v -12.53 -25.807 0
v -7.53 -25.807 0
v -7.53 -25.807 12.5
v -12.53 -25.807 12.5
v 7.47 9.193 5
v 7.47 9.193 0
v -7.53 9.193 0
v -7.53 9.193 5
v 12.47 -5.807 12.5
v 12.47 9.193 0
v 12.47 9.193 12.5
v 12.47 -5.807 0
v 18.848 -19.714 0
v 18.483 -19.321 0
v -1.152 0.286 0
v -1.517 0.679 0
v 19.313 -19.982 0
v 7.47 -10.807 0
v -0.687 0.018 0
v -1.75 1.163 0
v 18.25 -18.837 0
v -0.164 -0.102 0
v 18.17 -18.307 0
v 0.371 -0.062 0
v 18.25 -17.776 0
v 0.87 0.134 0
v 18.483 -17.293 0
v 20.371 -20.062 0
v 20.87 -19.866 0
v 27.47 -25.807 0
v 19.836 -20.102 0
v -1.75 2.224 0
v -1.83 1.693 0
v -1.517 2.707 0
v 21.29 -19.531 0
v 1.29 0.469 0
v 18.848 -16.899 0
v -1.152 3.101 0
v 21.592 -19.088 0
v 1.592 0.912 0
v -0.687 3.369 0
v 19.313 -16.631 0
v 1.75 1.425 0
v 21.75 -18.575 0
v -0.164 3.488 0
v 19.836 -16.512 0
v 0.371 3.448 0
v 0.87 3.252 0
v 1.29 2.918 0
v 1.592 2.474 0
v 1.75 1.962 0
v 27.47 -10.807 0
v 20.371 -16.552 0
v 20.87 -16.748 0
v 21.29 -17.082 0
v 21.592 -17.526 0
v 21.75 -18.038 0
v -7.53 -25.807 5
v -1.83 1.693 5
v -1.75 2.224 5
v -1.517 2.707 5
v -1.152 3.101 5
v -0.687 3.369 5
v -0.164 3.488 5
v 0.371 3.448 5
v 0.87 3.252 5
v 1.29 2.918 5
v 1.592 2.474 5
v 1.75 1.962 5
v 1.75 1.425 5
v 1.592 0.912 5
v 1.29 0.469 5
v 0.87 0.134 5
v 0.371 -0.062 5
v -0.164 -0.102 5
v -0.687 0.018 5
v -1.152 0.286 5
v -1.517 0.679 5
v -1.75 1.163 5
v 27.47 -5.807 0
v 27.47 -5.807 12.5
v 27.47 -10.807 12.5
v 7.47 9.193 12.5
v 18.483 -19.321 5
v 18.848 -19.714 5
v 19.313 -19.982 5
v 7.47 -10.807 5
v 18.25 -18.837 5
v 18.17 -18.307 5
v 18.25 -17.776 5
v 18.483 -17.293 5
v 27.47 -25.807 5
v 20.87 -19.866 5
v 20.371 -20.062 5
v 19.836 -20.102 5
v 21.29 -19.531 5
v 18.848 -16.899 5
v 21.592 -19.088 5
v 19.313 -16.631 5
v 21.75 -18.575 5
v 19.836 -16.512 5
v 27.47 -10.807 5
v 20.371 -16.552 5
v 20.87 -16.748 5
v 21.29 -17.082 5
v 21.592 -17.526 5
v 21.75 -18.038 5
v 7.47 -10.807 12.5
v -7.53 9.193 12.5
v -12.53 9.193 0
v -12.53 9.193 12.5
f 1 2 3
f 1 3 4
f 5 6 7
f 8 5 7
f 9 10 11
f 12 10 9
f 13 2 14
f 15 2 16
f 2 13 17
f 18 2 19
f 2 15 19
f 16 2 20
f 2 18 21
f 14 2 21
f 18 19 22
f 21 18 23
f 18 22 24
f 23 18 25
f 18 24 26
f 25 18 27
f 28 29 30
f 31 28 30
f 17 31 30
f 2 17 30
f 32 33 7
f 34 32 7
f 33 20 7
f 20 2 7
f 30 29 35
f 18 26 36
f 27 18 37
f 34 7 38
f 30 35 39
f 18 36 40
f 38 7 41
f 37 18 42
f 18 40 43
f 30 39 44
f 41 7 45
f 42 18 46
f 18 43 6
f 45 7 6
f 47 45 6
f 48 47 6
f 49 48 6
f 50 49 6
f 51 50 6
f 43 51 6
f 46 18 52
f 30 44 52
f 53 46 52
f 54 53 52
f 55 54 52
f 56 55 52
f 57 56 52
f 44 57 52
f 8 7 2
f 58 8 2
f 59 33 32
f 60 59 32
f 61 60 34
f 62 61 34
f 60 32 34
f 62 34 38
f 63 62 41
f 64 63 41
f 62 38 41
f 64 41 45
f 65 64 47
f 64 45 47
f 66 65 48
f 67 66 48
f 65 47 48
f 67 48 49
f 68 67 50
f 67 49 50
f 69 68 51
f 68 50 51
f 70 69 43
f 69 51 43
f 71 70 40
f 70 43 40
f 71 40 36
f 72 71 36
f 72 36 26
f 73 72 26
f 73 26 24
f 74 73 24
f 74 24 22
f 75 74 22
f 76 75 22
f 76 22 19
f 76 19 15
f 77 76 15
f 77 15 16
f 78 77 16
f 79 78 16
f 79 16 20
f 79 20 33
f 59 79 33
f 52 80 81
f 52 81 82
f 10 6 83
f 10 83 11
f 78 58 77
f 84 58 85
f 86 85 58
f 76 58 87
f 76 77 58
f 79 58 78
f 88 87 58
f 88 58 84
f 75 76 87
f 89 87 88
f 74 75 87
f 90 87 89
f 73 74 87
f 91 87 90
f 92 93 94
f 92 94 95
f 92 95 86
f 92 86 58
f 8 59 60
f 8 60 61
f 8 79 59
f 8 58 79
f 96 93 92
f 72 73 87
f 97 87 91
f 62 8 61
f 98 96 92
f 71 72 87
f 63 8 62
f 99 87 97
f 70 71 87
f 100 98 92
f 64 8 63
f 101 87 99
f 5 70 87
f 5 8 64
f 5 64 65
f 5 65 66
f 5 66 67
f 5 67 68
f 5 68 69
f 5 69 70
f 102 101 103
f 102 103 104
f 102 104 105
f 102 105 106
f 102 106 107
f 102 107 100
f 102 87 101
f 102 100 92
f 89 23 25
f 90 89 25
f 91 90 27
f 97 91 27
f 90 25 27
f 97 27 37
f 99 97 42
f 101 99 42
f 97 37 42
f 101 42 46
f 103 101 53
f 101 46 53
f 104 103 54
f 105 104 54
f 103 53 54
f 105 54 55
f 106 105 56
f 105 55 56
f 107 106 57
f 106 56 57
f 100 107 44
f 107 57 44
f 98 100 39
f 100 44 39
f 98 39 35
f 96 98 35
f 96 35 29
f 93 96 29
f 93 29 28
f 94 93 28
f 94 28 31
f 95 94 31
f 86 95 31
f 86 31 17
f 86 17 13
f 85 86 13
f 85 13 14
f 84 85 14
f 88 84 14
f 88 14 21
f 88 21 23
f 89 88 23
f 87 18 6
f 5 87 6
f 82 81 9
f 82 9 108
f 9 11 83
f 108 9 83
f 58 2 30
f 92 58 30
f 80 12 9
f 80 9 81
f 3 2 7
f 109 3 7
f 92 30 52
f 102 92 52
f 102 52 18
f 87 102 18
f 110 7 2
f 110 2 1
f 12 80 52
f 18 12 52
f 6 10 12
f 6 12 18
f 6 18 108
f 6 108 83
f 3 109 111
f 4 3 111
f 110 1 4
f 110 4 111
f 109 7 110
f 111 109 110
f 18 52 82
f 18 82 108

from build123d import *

# Parameters (mm, degrees)
BOSS_EXTRUDE1_DEPTH = 5
BOSS_EXTRUDE2_DEPTH = 12.5
SKETCH3_W           = 5
SKETCH3_H           = 35
BOSS_EXTRUDE3_DEPTH = 12.5
SKETCH4_R           = 1.8
CUT_EXTRUDE1_DEPTH  = 13.5


with BuildPart() as part:
    # Sketch1 → Boss-Extrude1 (new body)
    with BuildSketch(Plane.XY):
        Polygon((-7.529880478, -25.806772908), (27.470119522, -25.806772908), (27.470119522, -10.806772908), (7.470119522, -10.806772908), (7.470119522, 9.193227092), (-7.529880478, 9.193227092), align=None)
    extrude(amount=BOSS_EXTRUDE1_DEPTH)

    # Sketch4 → Cut-Extrude1 (cut, through all)
    with BuildSketch(Plane(origin=(0, 0, 0), x_dir=(-1, 0, 0), z_dir=(0, 0, -1))):
        with Locations((0.029880478, 1.693227092)):
            Circle(SKETCH4_R)
        with Locations((-19.970119522, -18.306772908)):
            Circle(SKETCH4_R)
    extrude(amount=-CUT_EXTRUDE1_DEPTH, mode=Mode.SUBTRACT)


with BuildPart() as body_2:
    # Sketch2 → Boss-Extrude2 (new body)
    with BuildSketch(Plane(origin=(0, 0, 0), x_dir=(-1, 0, 0), z_dir=(0, 0, -1))):
        Polygon((-7.470119522, 9.193227092), (-12.470119522, 9.193227092), (-12.470119522, -5.806772908), (-27.470119522, -5.806772908), (-27.470119522, -10.806772908), (-7.470119522, -10.806772908), align=None)
    extrude(amount=-BOSS_EXTRUDE2_DEPTH)


with BuildPart() as body_3:
    # Sketch3 → Boss-Extrude3 (new body)
    with BuildSketch(Plane(origin=(0, 0, 0), x_dir=(-1, 0, 0), z_dir=(0, 0, -1))):
        with Locations((10.029880478, -8.306772908)):
            Rectangle(SKETCH3_W, SKETCH3_H)
    extrude(amount=-BOSS_EXTRUDE3_DEPTH)


solid = Compound([part.part, body_2.part, body_3.part])
